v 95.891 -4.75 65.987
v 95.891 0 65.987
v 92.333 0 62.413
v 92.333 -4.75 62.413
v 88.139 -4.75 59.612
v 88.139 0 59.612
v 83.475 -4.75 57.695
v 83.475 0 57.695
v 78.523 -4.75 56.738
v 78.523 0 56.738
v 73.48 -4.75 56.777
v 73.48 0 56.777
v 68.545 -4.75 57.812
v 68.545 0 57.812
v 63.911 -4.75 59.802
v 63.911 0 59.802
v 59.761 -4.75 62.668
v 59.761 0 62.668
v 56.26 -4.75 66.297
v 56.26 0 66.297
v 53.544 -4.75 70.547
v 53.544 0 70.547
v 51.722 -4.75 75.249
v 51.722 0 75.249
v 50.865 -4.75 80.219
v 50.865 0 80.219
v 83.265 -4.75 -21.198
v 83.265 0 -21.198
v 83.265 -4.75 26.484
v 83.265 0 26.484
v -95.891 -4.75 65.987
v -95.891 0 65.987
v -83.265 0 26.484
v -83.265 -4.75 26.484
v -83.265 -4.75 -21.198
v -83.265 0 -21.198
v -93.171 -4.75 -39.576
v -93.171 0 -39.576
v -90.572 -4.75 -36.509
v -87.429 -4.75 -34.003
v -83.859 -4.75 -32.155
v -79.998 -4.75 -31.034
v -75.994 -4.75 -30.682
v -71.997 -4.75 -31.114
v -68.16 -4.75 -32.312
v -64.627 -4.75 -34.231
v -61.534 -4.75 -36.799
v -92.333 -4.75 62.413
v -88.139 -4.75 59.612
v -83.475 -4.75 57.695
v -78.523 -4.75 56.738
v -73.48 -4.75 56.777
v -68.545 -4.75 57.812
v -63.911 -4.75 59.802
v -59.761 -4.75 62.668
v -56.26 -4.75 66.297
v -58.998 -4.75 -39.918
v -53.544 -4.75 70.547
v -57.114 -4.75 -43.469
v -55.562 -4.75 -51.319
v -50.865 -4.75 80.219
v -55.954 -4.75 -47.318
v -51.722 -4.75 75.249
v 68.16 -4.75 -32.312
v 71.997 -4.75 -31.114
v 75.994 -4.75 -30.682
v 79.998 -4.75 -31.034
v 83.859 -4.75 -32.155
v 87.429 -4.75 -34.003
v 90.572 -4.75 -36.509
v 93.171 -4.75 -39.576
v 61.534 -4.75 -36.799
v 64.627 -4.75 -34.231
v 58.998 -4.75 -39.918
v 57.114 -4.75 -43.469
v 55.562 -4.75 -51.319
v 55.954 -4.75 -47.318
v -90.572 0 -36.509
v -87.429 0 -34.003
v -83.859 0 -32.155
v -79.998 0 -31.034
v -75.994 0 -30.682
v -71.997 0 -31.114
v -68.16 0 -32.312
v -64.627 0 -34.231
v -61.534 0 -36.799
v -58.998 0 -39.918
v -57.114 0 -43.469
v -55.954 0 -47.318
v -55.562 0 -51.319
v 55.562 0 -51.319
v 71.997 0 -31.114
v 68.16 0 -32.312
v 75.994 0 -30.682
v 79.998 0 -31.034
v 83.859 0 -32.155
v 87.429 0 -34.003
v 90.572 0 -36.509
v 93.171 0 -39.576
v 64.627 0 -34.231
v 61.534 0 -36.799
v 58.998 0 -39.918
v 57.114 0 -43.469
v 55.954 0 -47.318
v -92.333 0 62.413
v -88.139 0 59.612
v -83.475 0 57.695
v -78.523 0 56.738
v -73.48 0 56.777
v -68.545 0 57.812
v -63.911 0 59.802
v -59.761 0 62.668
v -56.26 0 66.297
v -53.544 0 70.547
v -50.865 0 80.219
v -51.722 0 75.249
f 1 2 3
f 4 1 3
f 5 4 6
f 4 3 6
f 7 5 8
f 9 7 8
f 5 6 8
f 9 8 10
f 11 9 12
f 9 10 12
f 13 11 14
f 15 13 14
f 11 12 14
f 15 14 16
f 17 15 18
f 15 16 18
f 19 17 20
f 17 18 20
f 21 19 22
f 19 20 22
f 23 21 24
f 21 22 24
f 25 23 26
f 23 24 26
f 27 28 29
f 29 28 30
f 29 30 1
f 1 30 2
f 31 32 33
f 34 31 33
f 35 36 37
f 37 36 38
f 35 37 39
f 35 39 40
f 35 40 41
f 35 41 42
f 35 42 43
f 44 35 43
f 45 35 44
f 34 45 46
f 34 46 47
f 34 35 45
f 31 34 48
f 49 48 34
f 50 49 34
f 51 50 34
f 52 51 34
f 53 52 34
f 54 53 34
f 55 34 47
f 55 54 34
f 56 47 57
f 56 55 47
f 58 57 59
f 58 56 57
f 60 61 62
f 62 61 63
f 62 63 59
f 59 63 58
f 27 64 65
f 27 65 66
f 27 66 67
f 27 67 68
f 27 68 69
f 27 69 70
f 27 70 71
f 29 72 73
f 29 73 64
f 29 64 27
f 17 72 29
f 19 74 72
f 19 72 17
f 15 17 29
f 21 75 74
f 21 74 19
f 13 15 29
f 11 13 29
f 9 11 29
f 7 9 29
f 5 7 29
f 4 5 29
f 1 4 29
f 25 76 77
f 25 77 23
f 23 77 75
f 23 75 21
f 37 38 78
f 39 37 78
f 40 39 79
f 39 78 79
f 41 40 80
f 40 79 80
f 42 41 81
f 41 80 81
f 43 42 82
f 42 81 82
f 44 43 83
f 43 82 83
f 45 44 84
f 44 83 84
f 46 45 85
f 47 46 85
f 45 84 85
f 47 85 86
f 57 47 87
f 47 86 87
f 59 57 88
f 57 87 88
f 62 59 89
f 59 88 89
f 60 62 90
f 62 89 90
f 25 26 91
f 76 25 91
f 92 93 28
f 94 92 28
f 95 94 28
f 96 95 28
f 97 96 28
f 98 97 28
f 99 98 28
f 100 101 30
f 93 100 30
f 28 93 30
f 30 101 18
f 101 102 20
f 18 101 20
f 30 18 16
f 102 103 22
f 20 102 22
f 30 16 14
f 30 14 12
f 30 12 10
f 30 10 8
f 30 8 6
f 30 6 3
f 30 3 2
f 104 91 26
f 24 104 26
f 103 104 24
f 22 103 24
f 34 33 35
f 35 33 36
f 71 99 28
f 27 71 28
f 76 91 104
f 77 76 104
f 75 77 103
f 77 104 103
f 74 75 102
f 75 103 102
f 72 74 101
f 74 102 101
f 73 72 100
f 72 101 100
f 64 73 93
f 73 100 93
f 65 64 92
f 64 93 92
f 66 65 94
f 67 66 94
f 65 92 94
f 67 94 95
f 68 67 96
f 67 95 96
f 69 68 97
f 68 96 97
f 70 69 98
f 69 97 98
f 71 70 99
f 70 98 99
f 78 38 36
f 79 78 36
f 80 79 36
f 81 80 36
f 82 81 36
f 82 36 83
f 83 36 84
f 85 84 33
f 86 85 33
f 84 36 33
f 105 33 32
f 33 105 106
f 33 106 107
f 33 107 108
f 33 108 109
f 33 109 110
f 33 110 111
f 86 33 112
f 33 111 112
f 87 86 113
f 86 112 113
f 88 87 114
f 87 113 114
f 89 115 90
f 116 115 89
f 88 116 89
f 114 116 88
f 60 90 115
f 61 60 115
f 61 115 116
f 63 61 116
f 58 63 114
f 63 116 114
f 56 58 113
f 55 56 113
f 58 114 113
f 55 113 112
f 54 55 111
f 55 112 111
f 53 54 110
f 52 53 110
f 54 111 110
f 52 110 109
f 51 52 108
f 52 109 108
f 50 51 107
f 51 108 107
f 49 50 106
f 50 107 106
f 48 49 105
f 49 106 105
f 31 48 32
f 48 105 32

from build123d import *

# Parameters (mm, degrees)
F1_DEPTH = 4.7498


with BuildPart() as f1:
    # F0 (on Front) → F1 (new body)
    with BuildSketch(Plane.XZ):
        with BuildLine():
            ThreePointArc((-50.864713, 80.219096), (-68.544575, 57.812184), (-95.890985, 65.986598))
            Line((-95.890985, 65.986598), (-83.26491, 26.484452))
            Line((-83.26491, 26.484452), (-83.26491, -21.198424))
            Line((-83.26491, -21.198424), (-93.170879, -39.57603))
            ThreePointArc((-93.170879, -39.57603), (-70.048988, -31.6194), (-55.5625, -51.31893))
            Line((-55.5625, -51.31893), (-50.864713, 80.219096))
        make_face()
        with BuildLine():
            Line((83.26491, 26.484452), (95.890985, 65.986598))
            ThreePointArc((95.890985, 65.986598), (68.544575, 57.812184), (50.864713, 80.219096))
            Line((50.864713, 80.219096), (55.5625, -51.31893))
            ThreePointArc((55.5625, -51.31893), (70.048988, -31.6194), (93.170879, -39.57603))
            Line((93.170879, -39.57603), (83.26491, -21.198424))
            Line((83.26491, -21.198424), (83.26491, 26.484452))
        make_face()
    extrude(amount=F1_DEPTH)


solid = f1.part
